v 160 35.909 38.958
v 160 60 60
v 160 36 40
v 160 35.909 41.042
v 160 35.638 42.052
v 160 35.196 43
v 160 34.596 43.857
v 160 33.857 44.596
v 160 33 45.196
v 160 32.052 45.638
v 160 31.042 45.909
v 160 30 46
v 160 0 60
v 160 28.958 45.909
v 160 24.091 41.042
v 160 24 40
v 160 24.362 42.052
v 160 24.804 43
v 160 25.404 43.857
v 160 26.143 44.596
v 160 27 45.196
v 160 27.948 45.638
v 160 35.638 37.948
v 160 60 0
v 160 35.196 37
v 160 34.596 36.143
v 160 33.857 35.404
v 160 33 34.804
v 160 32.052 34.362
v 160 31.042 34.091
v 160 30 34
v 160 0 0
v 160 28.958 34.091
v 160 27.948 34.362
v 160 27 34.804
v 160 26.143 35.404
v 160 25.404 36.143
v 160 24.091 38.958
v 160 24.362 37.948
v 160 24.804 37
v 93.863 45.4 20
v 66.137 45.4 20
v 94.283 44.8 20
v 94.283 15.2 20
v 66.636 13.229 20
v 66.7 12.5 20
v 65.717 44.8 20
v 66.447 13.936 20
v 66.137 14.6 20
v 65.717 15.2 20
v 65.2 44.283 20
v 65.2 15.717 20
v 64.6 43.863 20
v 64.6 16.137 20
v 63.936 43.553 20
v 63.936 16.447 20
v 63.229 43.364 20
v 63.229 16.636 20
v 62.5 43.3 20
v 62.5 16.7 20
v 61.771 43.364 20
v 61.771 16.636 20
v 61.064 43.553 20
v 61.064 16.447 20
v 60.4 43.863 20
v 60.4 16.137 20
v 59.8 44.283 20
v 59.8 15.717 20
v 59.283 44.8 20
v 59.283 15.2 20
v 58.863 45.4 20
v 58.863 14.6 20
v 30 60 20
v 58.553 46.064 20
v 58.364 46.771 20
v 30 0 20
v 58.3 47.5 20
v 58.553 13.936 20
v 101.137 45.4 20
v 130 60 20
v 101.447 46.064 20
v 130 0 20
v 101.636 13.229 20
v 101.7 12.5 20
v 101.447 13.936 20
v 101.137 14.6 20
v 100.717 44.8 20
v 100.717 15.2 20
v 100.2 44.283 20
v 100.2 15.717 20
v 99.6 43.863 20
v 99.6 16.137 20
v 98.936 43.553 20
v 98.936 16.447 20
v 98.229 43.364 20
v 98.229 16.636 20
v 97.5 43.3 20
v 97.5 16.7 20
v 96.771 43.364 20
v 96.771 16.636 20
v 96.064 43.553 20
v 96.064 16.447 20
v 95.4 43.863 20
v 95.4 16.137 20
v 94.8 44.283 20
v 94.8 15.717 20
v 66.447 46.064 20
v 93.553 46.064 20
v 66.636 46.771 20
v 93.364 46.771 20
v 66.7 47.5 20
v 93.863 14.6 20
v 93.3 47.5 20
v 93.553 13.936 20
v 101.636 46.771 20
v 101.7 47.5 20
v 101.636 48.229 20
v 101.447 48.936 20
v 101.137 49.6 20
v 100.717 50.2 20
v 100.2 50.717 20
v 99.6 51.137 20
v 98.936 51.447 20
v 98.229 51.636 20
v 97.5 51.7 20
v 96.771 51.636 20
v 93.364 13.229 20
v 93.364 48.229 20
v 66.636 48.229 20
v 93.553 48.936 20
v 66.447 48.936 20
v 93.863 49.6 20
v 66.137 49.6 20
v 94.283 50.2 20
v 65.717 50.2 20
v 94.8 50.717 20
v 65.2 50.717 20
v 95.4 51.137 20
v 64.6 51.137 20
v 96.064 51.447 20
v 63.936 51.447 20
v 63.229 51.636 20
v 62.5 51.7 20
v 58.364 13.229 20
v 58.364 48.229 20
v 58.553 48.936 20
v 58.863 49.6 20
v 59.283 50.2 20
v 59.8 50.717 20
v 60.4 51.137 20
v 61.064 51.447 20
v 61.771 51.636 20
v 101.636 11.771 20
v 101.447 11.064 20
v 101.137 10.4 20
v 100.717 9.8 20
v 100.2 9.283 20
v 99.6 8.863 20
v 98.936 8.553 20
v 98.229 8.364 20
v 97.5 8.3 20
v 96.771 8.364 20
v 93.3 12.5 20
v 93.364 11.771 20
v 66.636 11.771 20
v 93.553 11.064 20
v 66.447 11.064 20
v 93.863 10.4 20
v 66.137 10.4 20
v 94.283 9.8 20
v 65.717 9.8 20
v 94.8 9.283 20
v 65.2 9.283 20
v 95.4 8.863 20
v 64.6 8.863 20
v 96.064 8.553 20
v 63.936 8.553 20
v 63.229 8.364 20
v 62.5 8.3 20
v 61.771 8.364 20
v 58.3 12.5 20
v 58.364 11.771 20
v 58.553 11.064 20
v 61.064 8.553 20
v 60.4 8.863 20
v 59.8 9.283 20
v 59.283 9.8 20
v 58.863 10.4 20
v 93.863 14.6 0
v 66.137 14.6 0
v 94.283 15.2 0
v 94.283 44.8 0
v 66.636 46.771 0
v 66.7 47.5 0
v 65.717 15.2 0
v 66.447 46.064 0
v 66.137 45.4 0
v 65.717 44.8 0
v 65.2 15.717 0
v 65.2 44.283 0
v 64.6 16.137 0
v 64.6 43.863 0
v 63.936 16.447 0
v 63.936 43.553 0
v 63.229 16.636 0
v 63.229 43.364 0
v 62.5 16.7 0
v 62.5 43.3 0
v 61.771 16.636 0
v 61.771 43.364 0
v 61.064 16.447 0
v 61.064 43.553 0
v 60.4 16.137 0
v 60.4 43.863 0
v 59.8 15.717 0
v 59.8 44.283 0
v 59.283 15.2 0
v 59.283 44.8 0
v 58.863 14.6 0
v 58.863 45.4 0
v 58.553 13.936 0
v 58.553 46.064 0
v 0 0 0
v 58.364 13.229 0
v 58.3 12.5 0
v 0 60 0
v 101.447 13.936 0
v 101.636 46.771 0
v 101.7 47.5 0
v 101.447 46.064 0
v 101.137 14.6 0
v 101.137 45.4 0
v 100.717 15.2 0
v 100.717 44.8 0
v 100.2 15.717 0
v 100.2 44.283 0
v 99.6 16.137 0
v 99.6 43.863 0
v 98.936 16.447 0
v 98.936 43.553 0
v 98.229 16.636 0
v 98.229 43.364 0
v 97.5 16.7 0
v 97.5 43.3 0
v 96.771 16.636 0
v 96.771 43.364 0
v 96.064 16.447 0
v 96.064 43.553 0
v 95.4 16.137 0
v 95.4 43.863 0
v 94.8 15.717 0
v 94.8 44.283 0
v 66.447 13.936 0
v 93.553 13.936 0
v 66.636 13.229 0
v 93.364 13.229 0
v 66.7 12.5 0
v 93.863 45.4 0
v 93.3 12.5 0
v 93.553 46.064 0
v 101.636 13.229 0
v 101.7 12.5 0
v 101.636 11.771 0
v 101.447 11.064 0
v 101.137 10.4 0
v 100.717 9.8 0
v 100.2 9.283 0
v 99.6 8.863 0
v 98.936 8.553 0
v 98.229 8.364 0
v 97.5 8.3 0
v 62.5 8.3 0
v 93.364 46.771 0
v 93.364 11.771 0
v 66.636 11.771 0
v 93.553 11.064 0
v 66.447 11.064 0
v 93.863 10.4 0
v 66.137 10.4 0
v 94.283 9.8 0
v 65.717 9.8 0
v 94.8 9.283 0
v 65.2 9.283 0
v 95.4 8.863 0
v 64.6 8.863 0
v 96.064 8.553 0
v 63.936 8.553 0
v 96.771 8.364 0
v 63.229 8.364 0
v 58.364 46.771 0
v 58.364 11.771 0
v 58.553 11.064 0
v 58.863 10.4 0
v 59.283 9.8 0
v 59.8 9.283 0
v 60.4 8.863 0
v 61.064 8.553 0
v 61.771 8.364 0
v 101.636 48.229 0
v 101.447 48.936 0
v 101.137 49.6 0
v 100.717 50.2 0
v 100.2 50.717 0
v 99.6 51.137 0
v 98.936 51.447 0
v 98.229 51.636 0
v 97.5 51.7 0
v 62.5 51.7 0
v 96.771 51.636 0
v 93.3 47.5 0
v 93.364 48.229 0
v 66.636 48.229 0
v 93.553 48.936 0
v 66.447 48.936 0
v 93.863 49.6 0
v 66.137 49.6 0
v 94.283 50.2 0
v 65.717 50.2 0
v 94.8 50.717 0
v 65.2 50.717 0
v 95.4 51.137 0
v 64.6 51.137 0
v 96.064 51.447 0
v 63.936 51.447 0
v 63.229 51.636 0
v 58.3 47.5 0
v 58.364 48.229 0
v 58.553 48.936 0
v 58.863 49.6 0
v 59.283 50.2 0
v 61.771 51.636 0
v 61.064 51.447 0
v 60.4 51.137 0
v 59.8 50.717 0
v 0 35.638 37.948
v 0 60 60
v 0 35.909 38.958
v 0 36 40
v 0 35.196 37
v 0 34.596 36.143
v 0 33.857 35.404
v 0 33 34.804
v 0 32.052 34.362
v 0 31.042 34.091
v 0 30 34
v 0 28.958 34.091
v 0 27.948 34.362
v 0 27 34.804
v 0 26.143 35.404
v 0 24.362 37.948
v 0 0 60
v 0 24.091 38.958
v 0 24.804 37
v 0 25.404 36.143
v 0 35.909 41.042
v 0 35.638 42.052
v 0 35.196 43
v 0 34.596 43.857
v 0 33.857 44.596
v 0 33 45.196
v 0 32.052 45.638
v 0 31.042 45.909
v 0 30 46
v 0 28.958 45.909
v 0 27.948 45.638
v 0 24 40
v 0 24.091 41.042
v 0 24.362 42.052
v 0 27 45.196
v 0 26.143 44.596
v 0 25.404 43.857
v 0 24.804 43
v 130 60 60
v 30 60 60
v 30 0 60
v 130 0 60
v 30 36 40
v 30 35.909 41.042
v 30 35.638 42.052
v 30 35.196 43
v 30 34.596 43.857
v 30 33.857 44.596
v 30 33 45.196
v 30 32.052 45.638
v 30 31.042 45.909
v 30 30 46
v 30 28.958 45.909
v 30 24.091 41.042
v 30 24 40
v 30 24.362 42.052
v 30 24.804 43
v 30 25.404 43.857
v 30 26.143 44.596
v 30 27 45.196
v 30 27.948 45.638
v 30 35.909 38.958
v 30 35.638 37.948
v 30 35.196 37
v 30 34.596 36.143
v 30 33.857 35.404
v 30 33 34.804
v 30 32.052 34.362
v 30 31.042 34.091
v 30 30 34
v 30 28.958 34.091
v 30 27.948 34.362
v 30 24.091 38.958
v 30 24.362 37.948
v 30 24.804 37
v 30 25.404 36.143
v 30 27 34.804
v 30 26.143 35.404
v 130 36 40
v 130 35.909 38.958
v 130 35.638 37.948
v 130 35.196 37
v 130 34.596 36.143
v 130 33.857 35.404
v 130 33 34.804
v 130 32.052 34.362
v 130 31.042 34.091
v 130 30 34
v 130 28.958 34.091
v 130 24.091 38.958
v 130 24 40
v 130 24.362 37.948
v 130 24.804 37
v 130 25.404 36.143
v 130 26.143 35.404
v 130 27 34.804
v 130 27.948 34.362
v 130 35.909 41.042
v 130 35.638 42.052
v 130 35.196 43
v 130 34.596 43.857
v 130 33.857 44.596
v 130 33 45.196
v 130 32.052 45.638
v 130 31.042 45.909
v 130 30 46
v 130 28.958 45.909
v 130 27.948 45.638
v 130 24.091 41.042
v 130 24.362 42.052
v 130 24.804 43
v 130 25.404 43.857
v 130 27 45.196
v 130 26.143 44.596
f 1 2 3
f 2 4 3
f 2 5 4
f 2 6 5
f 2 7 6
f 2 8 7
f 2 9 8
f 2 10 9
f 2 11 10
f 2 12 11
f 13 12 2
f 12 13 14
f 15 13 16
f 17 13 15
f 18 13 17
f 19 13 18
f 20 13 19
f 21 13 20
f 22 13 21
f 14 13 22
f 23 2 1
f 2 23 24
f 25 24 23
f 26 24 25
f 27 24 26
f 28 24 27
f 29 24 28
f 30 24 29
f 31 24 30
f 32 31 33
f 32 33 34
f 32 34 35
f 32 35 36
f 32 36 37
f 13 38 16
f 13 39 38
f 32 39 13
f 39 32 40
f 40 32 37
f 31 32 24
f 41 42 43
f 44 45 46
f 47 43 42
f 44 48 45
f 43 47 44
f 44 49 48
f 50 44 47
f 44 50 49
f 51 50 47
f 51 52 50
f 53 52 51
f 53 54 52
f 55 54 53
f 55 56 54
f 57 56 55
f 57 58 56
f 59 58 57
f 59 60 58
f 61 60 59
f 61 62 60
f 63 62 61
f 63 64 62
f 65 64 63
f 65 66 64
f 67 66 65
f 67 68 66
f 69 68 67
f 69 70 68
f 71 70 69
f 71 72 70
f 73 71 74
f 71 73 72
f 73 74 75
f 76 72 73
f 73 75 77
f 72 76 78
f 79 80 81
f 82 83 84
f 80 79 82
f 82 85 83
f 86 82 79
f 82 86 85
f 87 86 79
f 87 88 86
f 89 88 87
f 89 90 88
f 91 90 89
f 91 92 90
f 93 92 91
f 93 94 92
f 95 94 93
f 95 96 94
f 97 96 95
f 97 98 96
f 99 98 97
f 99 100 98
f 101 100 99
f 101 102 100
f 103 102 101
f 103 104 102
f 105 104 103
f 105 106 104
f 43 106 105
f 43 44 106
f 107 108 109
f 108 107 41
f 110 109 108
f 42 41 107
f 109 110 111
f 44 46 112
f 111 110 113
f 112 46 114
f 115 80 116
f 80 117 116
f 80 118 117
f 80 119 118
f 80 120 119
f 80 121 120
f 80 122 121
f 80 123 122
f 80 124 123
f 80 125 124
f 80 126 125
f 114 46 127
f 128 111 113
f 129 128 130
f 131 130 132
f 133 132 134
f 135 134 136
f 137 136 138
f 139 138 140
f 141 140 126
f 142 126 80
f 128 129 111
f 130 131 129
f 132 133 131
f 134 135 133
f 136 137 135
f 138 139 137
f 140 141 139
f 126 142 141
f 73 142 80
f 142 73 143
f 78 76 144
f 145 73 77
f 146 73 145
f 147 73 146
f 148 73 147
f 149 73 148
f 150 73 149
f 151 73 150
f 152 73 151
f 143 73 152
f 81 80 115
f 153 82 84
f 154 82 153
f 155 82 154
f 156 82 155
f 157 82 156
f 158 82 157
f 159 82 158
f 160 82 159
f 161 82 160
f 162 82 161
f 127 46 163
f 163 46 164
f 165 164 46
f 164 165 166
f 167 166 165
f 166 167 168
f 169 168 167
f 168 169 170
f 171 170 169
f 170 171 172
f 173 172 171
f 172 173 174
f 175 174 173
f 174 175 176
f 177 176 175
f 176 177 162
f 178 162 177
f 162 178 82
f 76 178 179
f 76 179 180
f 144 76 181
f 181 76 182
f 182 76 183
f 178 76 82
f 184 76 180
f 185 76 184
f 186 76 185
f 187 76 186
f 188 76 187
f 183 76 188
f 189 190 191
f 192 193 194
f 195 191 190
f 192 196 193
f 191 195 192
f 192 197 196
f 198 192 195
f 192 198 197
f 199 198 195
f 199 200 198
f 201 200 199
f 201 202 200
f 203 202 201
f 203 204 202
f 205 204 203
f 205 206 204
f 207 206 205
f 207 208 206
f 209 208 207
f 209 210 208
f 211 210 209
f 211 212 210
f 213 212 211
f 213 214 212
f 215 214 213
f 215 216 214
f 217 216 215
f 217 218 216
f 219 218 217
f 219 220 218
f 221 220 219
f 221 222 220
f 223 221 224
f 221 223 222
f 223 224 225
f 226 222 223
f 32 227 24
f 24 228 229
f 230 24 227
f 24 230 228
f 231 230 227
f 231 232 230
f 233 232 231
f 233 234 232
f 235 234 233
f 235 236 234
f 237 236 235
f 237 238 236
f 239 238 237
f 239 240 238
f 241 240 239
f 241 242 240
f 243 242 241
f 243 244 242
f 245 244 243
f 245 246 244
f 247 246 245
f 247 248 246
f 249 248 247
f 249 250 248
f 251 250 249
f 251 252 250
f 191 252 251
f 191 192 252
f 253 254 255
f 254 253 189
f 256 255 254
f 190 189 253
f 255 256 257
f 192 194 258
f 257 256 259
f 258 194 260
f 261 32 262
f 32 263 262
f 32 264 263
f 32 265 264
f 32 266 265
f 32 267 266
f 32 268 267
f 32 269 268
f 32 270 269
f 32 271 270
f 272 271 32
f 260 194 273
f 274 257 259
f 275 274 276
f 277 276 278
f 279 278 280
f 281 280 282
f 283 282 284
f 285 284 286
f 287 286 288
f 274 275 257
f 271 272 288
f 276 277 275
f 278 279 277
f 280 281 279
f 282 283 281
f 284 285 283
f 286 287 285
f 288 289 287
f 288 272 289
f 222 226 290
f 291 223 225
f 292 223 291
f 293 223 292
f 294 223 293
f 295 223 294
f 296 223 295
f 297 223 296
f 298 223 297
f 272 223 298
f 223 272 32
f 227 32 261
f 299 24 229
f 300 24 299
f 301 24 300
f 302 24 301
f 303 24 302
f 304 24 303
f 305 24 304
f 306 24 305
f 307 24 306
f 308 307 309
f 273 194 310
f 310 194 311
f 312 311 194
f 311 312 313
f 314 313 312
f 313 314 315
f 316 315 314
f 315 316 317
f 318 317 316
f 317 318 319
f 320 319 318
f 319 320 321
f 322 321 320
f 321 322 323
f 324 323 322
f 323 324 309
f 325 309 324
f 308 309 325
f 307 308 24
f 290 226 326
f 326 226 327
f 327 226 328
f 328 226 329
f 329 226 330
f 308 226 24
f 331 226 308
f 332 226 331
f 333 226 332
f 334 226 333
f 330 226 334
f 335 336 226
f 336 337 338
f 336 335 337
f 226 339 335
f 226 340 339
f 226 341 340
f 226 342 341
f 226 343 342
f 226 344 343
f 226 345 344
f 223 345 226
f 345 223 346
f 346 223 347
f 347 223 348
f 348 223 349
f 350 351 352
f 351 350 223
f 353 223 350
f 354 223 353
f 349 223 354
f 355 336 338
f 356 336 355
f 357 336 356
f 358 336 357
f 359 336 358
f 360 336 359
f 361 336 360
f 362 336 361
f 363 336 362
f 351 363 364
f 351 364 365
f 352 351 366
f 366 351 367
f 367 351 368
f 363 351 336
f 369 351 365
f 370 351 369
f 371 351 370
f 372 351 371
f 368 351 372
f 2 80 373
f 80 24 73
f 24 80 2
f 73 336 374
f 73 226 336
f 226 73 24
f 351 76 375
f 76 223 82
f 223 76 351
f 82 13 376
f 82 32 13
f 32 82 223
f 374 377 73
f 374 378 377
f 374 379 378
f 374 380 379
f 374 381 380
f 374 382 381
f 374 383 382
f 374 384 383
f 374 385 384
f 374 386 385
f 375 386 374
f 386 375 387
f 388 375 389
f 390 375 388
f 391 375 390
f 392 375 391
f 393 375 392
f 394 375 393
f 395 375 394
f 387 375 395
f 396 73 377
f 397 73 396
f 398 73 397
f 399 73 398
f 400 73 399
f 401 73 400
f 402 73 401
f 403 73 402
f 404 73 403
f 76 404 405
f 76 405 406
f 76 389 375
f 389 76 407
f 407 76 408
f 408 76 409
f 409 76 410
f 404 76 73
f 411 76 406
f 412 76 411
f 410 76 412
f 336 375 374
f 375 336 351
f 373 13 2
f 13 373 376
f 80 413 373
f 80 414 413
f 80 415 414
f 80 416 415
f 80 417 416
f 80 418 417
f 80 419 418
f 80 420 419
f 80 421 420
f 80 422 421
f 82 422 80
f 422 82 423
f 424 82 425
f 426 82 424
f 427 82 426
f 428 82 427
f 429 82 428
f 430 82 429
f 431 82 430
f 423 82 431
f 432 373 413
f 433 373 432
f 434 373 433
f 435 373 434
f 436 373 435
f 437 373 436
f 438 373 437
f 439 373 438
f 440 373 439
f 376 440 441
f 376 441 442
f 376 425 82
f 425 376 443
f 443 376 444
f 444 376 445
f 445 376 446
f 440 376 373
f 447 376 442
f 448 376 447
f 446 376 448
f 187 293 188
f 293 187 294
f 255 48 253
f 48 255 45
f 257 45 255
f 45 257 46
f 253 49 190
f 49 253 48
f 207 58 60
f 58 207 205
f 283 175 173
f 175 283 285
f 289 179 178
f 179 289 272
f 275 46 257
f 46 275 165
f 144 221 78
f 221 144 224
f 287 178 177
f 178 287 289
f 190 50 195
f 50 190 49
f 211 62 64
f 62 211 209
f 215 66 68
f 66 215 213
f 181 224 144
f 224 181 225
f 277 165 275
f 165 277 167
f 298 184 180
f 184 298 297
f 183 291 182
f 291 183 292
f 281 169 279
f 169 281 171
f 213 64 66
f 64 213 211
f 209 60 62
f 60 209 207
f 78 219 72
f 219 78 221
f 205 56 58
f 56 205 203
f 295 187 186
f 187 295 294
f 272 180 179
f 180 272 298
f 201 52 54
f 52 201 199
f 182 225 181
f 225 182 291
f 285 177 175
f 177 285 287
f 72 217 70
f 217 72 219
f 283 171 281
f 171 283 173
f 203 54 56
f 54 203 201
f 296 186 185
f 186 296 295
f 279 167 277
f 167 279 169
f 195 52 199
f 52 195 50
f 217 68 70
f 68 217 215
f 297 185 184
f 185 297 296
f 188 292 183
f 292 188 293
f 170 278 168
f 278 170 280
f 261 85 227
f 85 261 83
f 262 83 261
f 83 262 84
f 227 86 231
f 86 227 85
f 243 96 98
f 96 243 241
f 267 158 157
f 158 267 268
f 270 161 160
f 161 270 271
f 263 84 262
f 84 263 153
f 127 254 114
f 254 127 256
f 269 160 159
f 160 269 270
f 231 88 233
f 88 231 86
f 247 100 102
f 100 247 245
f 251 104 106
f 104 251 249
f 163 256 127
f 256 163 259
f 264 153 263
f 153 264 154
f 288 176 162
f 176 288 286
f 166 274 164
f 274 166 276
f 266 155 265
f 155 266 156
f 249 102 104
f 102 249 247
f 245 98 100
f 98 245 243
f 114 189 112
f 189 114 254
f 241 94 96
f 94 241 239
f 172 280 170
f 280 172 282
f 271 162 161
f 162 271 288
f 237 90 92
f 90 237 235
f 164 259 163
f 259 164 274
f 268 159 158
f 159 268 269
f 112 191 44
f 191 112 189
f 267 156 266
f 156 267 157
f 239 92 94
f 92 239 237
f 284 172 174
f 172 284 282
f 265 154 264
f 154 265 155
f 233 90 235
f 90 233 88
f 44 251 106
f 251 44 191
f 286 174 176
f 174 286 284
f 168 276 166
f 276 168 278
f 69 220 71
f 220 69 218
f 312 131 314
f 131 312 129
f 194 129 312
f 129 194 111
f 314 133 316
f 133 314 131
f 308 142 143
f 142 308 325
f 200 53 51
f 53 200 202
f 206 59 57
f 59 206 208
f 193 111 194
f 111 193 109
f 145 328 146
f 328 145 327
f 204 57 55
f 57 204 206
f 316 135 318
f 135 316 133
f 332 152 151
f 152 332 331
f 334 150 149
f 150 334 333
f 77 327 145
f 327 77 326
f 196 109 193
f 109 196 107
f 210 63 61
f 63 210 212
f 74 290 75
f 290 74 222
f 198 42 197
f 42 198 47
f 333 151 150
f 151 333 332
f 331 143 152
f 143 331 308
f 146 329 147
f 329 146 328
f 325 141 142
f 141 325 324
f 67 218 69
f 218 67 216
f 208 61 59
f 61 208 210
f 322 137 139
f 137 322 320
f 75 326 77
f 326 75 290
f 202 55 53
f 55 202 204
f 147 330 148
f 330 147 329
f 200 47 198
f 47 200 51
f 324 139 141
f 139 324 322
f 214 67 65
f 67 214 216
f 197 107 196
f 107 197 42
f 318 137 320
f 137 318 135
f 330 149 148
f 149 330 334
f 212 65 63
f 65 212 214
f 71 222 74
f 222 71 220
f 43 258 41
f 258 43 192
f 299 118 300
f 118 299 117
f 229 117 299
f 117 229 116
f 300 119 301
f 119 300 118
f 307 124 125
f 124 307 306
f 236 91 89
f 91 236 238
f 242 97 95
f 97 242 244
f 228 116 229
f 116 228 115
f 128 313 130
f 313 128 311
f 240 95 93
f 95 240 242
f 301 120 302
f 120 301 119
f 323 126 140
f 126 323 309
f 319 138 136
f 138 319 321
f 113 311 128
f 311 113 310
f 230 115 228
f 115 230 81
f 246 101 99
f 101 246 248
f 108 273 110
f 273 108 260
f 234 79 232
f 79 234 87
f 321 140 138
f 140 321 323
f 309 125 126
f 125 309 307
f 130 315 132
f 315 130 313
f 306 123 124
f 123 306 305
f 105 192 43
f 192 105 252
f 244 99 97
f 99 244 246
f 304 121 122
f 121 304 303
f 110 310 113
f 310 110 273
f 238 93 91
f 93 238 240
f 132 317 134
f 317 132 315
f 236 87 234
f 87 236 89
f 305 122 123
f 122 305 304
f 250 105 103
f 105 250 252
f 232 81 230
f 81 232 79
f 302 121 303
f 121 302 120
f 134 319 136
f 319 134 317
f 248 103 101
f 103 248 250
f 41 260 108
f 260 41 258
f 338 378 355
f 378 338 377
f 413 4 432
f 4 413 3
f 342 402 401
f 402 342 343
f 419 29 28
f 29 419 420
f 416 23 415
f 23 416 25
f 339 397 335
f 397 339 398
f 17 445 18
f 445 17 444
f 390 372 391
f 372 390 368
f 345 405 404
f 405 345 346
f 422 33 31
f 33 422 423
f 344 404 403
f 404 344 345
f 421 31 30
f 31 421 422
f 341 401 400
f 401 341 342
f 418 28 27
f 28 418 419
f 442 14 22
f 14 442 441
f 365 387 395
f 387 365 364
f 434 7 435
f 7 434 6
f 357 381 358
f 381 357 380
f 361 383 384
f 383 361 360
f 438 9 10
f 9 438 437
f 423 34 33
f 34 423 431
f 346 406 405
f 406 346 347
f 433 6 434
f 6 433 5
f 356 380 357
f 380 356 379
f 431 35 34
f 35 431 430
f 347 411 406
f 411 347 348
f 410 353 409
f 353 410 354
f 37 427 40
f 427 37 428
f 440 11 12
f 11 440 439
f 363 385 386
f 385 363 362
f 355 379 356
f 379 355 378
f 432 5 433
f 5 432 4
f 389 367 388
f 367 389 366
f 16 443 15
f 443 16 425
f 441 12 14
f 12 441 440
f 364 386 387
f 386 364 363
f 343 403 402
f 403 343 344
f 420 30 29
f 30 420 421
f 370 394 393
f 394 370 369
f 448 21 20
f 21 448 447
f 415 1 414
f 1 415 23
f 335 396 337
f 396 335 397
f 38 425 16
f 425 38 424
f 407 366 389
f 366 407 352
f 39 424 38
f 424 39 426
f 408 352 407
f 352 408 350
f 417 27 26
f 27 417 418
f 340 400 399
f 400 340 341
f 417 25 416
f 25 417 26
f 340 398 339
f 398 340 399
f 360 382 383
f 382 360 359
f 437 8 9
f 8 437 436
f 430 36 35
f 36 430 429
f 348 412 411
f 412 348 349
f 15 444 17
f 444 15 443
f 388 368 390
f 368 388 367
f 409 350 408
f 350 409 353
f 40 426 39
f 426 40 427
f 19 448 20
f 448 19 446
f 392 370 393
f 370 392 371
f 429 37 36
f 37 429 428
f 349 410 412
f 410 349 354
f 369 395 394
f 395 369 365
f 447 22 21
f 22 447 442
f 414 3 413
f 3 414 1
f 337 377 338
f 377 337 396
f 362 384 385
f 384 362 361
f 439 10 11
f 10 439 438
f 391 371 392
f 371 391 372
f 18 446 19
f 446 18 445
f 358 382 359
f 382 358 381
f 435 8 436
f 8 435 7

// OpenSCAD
$fa = 10;
$fs = 0.5;

base_width = 160;
base_height = 60;
base_thickness = 20;

side_width = 30;
side_height = base_height;
side_thickness = 40;

module base()
{
    // base cube
    cube([ base_width, base_height, base_thickness ]);

    // left side
    translate([ 0, 0, base_thickness ]) cube([ side_width, side_height, side_thickness ]);

    // right side
    translate([ base_width - side_width, 0, base_thickness ]) cube([ side_width, side_height, side_thickness ]);
}

module hole_at_position(x, y)
{
    translate([ x, y, 0 ])
    {
        cylinder(h = 20, r = 4.2);
    }
}

module hole_through_sides(x, z)
{
    translate([ 0, base_height / 2, 40 ]) rotate([ 0, 90, 0 ])
    {
        cylinder(h = base_width, r = 6); // Extended height to pass through both sides
    }
}

module holes()
{
    spacing = 17.5;
    center_x = base_width / 2;
    center_y = base_height / 2;

    hole_at_position(center_x - spacing, center_y - spacing);
    hole_at_position(center_x + spacing, center_y - spacing);
    hole_at_position(center_x - spacing, center_y + spacing);
    hole_at_position(center_x + spacing, center_y + spacing);
}

difference()
{
    base();
    holes();
    hole_through_sides();
}
